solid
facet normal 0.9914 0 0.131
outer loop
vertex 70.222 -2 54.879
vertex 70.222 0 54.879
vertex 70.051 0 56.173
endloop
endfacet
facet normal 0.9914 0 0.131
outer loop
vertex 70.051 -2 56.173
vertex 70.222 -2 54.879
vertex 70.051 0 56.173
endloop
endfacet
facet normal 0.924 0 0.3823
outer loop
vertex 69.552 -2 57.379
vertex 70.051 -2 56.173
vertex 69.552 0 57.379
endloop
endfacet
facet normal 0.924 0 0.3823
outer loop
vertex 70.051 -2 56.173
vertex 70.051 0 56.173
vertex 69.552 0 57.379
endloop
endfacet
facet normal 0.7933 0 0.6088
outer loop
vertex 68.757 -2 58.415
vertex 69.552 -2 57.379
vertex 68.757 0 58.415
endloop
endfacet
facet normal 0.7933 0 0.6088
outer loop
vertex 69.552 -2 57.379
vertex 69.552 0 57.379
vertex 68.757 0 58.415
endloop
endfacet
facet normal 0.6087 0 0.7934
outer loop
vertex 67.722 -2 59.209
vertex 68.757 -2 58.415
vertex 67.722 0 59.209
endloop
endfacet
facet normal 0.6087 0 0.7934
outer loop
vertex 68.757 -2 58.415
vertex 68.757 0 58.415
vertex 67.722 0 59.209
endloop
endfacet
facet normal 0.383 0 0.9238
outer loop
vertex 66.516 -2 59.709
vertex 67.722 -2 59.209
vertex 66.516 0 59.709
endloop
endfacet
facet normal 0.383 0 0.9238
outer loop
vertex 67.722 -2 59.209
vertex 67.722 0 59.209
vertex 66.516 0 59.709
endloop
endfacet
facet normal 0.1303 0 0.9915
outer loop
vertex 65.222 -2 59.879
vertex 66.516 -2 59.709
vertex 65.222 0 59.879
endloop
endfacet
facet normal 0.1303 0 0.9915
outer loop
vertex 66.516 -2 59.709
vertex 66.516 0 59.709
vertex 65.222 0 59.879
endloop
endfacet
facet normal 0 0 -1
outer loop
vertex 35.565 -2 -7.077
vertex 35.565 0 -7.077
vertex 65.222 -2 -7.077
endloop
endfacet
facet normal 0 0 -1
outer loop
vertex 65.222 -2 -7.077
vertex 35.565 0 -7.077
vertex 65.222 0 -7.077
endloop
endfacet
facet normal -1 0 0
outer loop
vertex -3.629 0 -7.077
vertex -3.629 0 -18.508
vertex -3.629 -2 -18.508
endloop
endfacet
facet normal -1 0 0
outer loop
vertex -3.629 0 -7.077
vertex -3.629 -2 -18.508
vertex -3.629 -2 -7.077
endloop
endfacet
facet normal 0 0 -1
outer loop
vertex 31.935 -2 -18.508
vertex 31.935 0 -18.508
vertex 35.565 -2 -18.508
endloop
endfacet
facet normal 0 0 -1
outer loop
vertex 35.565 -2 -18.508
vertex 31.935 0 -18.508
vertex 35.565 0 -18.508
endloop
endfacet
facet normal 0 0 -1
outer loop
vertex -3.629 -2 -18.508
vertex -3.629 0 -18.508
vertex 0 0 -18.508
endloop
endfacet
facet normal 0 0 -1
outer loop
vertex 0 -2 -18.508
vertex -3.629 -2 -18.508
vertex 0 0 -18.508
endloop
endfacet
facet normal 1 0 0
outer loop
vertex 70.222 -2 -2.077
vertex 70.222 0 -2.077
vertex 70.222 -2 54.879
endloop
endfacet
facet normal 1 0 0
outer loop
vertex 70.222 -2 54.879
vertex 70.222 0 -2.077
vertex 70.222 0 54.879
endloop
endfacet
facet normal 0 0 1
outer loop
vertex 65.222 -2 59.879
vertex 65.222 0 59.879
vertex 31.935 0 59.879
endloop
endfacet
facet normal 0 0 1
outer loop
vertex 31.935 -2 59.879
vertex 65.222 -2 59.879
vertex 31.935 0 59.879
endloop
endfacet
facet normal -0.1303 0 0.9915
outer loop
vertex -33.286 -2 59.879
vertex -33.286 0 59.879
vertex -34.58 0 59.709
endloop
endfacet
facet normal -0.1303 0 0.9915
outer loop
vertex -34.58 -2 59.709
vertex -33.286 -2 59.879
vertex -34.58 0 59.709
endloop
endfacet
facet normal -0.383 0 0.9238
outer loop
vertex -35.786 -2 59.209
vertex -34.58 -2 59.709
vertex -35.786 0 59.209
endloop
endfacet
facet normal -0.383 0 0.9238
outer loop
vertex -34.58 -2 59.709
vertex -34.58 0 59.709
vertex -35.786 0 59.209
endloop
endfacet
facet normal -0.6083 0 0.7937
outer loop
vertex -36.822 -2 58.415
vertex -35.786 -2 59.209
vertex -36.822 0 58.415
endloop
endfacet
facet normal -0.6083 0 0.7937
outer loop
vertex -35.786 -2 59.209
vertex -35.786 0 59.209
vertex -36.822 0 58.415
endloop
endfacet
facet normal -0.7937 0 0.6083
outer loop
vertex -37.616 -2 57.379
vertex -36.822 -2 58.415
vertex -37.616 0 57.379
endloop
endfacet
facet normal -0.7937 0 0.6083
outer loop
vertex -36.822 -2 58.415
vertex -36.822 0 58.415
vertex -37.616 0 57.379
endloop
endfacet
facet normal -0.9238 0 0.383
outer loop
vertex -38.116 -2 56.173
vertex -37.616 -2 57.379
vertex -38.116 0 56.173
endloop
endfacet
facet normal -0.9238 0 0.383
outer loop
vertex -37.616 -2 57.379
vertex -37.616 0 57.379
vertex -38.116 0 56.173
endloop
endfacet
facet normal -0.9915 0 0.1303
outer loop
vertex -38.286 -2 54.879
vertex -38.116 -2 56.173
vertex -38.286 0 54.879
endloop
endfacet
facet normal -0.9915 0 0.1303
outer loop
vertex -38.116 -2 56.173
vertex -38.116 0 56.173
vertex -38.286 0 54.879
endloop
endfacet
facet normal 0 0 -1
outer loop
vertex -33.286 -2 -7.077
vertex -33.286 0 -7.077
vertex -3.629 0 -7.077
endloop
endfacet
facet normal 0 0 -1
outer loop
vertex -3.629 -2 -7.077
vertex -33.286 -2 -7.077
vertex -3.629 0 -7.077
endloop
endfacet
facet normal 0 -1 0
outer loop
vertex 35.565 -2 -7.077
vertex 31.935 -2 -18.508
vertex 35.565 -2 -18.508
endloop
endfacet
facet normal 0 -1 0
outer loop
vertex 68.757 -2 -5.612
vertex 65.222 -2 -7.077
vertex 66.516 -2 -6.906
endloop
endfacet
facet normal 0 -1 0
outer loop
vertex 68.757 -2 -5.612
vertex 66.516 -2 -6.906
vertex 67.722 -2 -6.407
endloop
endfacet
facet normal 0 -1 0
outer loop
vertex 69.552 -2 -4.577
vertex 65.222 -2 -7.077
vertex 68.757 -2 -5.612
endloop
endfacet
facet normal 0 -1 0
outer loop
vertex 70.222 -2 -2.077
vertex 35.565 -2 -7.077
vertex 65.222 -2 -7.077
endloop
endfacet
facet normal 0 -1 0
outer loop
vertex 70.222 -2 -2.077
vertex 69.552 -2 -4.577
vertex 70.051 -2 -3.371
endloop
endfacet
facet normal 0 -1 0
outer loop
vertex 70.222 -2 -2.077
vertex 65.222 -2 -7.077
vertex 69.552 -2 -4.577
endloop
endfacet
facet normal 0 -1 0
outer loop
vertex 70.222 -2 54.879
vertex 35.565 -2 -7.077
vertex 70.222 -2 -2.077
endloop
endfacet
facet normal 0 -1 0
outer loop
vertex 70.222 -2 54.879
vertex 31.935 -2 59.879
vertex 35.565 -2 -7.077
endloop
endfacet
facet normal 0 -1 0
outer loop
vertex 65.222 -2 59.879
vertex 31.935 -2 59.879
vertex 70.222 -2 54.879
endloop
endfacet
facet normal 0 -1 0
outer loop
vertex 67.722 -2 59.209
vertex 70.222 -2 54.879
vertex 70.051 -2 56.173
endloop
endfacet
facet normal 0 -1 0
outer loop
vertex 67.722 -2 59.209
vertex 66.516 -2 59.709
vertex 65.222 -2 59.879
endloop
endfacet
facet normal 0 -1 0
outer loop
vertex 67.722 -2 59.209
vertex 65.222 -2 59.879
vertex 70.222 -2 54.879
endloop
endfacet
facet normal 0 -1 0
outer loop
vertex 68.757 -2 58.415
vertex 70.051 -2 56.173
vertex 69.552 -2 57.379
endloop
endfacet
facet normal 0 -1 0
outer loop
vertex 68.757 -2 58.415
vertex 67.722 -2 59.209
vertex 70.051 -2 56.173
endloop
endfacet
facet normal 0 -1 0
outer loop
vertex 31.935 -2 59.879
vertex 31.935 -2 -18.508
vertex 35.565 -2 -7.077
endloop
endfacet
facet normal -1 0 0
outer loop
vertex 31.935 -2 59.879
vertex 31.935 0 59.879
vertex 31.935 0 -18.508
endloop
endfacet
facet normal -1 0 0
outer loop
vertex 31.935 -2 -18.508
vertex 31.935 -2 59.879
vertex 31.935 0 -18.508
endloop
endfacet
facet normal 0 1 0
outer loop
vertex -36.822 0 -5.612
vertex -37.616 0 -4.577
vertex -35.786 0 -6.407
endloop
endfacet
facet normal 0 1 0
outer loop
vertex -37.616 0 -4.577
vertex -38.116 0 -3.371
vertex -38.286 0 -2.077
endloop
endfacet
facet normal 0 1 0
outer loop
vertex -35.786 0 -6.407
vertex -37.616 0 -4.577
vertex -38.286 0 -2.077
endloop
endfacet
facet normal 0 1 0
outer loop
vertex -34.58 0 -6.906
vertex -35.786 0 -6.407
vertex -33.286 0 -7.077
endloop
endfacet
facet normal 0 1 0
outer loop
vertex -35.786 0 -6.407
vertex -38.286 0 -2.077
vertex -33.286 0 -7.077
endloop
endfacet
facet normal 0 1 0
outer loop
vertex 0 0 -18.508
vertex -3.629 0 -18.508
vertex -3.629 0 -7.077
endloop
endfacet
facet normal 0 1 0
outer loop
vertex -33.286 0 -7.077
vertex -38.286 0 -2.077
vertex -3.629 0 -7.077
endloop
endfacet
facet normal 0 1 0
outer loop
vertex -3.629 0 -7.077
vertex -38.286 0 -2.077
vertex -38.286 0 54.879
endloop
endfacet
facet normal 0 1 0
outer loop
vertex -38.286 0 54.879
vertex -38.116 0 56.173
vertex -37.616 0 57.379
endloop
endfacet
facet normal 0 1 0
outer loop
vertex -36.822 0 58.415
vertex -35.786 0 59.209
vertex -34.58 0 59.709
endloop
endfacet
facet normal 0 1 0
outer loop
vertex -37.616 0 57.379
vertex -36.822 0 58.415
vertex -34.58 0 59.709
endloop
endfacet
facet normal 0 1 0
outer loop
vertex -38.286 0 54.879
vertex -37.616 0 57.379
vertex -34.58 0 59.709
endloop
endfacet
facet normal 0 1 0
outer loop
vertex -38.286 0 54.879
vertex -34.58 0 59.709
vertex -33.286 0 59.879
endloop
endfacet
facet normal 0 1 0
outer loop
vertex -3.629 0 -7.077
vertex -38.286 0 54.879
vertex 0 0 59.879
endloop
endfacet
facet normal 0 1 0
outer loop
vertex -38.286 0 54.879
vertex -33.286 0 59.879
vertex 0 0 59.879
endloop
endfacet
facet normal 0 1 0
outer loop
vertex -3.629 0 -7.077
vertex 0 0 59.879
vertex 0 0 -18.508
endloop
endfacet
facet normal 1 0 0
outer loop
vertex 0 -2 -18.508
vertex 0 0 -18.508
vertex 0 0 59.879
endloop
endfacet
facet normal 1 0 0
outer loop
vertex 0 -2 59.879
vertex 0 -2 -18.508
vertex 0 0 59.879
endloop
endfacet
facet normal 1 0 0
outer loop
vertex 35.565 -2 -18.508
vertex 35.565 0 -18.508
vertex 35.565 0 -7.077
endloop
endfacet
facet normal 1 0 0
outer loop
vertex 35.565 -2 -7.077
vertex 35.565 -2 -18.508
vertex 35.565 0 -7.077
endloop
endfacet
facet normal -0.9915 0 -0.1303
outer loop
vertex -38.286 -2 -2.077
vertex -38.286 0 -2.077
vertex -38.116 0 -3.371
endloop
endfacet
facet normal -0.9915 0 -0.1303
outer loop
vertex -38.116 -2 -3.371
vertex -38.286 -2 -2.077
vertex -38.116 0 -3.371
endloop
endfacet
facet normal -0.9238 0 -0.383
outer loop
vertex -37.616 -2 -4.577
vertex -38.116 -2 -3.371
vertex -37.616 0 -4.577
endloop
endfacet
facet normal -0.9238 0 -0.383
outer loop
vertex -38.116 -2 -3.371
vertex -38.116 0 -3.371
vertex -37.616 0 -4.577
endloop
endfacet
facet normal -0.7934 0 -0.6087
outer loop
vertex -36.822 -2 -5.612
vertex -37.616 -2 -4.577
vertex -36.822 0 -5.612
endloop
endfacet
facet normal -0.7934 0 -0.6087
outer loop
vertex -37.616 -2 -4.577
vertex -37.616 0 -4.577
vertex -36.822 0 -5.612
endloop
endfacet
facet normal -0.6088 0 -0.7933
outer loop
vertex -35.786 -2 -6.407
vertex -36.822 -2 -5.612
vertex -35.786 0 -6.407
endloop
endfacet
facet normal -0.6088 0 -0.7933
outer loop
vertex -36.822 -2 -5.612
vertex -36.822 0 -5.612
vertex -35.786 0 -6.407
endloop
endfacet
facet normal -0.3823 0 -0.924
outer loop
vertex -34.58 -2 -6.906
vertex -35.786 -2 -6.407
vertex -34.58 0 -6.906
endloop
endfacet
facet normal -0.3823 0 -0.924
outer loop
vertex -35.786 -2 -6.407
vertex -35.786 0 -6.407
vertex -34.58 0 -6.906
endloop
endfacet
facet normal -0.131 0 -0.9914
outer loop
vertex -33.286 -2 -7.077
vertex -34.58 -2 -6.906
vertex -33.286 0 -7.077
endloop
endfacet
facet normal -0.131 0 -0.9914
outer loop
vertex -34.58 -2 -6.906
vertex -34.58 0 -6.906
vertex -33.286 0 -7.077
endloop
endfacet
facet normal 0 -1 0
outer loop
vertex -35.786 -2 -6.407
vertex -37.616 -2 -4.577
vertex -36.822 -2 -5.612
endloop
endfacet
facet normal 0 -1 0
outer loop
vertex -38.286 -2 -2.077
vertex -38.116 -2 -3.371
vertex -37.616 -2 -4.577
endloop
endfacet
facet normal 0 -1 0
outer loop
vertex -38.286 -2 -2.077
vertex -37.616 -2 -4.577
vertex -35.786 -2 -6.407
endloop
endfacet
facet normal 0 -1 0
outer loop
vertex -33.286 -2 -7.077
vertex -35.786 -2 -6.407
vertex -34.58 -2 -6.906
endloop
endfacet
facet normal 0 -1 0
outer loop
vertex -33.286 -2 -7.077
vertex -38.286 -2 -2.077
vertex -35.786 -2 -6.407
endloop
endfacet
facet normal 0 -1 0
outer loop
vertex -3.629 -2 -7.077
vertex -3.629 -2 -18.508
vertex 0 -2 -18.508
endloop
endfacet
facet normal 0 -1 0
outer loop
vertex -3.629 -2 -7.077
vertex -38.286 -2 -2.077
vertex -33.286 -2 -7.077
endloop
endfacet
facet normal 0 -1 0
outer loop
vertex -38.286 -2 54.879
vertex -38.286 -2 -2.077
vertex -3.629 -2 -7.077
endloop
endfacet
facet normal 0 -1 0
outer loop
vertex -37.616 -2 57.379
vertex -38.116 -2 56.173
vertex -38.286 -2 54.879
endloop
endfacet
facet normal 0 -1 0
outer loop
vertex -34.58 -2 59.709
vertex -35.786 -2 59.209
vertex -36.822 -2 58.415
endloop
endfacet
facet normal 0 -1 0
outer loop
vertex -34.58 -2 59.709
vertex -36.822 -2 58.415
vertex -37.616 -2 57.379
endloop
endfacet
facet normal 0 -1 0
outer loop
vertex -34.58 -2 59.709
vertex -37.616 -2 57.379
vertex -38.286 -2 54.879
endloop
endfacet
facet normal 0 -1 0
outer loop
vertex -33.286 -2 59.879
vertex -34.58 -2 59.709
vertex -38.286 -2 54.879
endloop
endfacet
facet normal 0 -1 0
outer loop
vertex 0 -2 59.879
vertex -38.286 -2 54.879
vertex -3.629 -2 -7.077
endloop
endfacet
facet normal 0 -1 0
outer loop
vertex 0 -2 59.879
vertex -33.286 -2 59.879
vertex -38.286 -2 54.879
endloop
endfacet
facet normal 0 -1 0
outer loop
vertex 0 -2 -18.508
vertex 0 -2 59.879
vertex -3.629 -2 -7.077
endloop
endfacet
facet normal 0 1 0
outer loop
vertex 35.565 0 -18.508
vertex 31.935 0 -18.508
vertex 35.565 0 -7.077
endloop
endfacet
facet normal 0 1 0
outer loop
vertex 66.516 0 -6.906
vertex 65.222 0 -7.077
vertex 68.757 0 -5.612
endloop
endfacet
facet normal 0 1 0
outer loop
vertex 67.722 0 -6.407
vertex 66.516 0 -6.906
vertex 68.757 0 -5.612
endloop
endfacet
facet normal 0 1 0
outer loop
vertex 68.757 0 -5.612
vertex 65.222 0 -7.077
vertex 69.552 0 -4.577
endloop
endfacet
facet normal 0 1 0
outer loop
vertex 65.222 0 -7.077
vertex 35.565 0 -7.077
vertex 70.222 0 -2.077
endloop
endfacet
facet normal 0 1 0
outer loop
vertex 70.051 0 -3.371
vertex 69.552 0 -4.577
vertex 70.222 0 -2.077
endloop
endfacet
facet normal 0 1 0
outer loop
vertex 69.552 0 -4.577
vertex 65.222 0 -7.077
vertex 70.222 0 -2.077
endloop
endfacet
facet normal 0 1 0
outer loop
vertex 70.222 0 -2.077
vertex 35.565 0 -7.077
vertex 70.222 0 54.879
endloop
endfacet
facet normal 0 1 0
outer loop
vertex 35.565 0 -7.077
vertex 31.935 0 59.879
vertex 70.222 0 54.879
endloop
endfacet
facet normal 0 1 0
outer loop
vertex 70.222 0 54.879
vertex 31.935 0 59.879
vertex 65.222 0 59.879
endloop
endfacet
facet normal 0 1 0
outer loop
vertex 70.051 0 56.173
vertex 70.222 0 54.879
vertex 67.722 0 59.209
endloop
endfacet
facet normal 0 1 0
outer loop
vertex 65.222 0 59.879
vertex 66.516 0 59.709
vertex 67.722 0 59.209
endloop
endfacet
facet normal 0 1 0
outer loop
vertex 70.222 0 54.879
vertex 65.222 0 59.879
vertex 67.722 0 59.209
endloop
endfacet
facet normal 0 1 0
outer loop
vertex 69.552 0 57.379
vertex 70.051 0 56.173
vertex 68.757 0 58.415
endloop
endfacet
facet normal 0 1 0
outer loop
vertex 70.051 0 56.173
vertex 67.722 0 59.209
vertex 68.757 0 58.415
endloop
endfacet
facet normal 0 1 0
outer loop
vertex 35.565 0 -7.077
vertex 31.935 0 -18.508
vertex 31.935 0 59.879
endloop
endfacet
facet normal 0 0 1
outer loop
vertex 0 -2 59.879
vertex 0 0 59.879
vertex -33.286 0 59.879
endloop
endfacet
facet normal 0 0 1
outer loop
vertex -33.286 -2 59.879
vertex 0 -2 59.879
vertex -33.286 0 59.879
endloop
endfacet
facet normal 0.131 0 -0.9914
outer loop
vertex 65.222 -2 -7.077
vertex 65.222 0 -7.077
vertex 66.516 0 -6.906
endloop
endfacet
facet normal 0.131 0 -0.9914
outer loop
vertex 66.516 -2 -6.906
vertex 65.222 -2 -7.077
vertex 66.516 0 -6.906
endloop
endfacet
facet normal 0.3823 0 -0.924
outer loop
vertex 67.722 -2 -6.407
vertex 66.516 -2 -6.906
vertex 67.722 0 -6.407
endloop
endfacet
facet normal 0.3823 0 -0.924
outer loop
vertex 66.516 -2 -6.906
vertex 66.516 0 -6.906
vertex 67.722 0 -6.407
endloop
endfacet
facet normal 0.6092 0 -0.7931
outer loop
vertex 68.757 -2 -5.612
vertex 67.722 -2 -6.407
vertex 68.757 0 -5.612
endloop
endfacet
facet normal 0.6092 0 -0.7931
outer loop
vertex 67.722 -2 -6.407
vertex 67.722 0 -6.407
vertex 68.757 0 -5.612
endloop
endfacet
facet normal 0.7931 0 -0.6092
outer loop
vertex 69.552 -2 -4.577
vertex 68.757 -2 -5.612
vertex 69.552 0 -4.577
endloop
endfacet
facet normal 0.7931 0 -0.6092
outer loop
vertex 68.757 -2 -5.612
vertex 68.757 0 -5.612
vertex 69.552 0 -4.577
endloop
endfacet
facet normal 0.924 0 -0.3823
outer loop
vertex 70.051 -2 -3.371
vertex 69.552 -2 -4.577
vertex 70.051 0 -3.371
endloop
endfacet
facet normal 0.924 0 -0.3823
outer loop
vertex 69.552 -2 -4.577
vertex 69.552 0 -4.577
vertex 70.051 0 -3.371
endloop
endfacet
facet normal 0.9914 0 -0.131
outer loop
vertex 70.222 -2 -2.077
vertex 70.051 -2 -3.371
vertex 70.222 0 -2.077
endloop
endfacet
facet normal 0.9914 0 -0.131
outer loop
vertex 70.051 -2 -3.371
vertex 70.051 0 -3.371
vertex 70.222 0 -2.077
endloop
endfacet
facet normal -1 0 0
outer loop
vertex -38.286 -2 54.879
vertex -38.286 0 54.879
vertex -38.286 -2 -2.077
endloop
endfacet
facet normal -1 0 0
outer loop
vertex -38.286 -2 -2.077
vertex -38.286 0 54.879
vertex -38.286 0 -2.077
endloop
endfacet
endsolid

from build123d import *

# Parameters (mm, degrees)
F0_W     = 3.629032
F0_H     = 11.431452
F1_DEPTH = 2


with BuildPart() as f1:
    # F0 (on Front) → F1 (new body)
    with BuildSketch(Plane.XZ):
        with BuildLine():
            Line((0, 59.879035), (-33.286291, 59.879035))
            ThreePointArc((-33.286291, 59.879035), (-36.821825, 58.414569), (-38.286291, 54.879035))
            Line((-38.286291, 54.879035), (-38.286291, -2.076613))
            ThreePointArc((-38.286291, -2.076613), (-36.821825, -5.612147), (-33.286291, -7.076613))
            Line((-33.286291, -7.076613), (-3.629032, -7.076613))
            Line((-3.629032, -7.076613), (0, -7.076613))
            Line((0, -7.076613), (0, 59.879035))
        make_face()
        with Locations((-1.814516, -12.792339)):
            Rectangle(F0_W, F0_H)
        with BuildLine():
            ThreePointArc((70.221778, 54.879035), (68.757312, 58.414569), (65.221778, 59.879035))
            Line((65.221778, 59.879035), (31.935487, 59.879035))
            Line((31.935487, 59.879035), (31.935487, -7.076613))
            Line((31.935487, -7.076613), (35.564519, -7.076613))
            Line((35.564519, -7.076613), (65.221778, -7.076613))
            ThreePointArc((65.221778, -7.076613), (68.757312, -5.612147), (70.221778, -2.076613))
            Line((70.221778, -2.076613), (70.221778, 54.879035))
        make_face()
        with Locations((33.750003, -12.792339)):
            Rectangle(F0_W, F0_H)
    extrude(amount=F1_DEPTH)


solid = f1.part
